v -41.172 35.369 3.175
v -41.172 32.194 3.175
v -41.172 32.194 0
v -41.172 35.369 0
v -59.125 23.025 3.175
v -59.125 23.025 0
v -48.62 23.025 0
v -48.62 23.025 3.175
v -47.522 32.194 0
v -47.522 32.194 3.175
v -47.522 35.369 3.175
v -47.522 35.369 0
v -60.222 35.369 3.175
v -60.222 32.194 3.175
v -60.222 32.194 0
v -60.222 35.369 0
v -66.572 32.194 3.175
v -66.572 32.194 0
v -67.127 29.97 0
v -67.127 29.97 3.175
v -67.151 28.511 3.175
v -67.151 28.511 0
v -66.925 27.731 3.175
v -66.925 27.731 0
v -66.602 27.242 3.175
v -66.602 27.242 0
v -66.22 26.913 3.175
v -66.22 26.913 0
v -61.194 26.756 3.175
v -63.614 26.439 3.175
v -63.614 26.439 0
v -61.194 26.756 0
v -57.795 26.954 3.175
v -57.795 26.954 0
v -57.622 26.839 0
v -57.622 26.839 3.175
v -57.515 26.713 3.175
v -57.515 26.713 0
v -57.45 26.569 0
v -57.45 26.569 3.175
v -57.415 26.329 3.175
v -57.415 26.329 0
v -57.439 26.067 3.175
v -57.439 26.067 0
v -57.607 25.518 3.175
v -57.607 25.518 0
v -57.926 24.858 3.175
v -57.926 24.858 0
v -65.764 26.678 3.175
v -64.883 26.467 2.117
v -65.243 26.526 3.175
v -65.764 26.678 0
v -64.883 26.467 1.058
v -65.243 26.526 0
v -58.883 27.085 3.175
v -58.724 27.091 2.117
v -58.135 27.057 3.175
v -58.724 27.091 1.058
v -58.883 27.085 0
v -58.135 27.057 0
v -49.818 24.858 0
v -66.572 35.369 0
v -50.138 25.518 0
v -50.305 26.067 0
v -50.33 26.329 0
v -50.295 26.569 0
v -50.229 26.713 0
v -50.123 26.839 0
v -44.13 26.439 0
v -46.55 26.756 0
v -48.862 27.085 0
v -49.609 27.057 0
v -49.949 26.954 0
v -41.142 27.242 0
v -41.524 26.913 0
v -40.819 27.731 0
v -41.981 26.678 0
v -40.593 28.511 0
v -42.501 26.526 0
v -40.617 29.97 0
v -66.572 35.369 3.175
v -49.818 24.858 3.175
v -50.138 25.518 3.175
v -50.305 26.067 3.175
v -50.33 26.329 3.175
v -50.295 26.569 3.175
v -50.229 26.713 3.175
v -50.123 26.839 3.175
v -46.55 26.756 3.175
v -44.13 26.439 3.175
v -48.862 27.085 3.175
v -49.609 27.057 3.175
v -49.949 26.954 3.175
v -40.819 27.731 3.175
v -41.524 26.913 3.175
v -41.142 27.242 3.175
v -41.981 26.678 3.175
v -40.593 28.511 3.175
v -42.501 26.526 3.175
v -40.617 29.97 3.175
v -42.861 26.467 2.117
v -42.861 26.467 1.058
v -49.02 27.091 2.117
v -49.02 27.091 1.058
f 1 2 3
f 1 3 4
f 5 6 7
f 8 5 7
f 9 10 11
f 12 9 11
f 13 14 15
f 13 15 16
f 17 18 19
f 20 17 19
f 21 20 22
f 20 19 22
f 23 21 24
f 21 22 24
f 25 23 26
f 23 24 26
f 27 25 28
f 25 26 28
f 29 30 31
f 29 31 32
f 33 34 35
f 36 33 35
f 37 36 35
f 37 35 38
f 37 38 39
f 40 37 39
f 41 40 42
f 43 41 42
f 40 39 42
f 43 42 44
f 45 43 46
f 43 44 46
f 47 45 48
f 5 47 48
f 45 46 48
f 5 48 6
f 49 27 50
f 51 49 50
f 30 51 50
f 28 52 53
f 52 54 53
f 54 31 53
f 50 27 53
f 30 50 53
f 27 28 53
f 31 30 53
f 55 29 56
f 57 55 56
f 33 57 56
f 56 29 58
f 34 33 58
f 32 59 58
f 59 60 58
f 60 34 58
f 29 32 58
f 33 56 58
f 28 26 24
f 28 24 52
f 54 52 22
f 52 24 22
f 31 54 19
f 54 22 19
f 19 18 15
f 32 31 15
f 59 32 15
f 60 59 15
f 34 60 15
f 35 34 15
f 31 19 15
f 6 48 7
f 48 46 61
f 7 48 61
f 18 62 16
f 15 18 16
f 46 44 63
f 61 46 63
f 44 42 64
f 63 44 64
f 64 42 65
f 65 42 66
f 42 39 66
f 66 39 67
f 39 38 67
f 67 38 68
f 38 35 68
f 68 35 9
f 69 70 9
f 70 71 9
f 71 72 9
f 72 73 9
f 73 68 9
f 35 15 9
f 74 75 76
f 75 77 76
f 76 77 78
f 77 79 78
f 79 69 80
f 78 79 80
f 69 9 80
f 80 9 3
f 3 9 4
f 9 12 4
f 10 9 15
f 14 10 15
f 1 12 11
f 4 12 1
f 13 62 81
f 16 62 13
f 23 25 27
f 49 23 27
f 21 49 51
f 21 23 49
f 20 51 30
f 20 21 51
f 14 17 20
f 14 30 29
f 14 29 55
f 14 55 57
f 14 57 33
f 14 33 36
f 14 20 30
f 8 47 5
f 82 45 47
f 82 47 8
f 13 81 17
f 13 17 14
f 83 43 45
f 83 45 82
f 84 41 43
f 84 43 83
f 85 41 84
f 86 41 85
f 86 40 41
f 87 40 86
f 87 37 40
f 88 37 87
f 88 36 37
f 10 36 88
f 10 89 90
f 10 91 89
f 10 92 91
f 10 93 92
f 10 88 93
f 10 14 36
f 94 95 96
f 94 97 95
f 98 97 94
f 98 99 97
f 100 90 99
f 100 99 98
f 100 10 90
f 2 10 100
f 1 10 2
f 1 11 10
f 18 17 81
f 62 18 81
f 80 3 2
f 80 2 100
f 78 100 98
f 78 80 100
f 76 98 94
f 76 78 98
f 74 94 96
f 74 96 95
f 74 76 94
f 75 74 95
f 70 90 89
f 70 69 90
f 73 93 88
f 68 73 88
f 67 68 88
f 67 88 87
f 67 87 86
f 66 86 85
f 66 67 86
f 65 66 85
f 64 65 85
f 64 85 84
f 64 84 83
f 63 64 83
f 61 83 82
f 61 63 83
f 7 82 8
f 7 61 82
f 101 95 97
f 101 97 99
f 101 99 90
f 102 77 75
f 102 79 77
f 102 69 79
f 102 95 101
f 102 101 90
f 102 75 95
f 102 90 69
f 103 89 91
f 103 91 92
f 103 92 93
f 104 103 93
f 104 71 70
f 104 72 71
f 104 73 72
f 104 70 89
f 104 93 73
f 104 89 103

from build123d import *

# Parameters (mm, degrees)
SKETCH1_W           = 6.35
SKETCH1_H           = 3.175
BOSS_EXTRUDE1_DEPTH = 3.175


with BuildPart() as part:
    # Sketch1 → Boss-Extrude1 (new body)
    with BuildSketch(Plane.XY):
        with Locations((-63.39715008, 33.781933128)):
            Rectangle(SKETCH1_W, SKETCH1_H)
        with BuildLine():
            Line((-60.22215008, 32.194433128), (-66.57215008, 32.194433128))
            add(Edge.make_bspline(
                [(-66.57215008, 32.194433128), (-70.796112031, 19.610192525), (-51.766503484, 33.116701814), (-59.124597577, 23.025033128)],
                knots=[0, 0, 0, 0, 1, 1, 1, 1], degree=3))
            Line((-59.124597577, 23.025033128), (-48.619702582, 23.025033128))
            add(Edge.make_bspline(
                [(-41.17215008, 32.194433128), (-36.948188128, 19.610192525), (-55.977796675, 33.116701814), (-48.619702582, 23.025033128)],
                knots=[0, 0, 0, 0, 1, 1, 1, 1], degree=3))
            Line((-41.17215008, 32.194433128), (-47.52215008, 32.194433128))
            Line((-47.52215008, 32.194433128), (-60.22215008, 32.194433128))
        make_face()
        with Locations((-44.34715008, 33.781933128)):
            Rectangle(SKETCH1_W, SKETCH1_H)
    extrude(amount=BOSS_EXTRUDE1_DEPTH)


solid = part.part
